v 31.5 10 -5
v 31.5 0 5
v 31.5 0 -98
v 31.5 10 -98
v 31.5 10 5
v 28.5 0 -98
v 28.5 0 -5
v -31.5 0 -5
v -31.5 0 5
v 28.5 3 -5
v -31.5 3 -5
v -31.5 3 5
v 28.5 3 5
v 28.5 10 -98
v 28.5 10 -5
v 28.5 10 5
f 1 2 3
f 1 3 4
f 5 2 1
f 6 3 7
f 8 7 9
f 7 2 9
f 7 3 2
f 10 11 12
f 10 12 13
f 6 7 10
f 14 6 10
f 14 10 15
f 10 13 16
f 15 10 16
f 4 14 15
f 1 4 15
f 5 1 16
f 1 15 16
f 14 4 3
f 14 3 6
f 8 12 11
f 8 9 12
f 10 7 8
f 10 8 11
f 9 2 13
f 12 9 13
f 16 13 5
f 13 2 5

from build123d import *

# Parameters (mm, degrees)
SKETCH_1_W          = 63
SKETCH_1_H          = 10
EXTRUDE_1_DEPTH     = 2
SKETCH_4_W          = 2
SKETCH_4_H          = 10
EXTRUDE_2_DEPTH     = 93
SKETCH_5_W          = 61
SKETCH_5_H          = 10
EXTRUDE_3_DEPTH     = 1
SKETCH_6_W          = 10
SKETCH_6_H          = 92
EXTRUDE_4_DEPTH     = 1
SKETCH_7_W          = 3
SKETCH_7_H          = 10
EXTRUDE_5_DEPTH     = 93
SKETCH_10_W         = 26.594312394
SKETCH_10_H         = 101.559656513
CUT_EXTRUDE_1_DEPTH = 93


with BuildPart() as part:
    # 草图1 → 凸台-拉伸1 (new body)
    with BuildSketch(Plane(origin=(0, 0, 0), x_dir=(1, 0, 0), z_dir=(0, 1, 0))):
        Rectangle(SKETCH_1_W, SKETCH_1_H)
    extrude(amount=EXTRUDE_1_DEPTH)

    # 草图4 → 凸台-拉伸2 (add)
    with BuildSketch(Plane(origin=(0, 2, 0), x_dir=(1, 0, 0), z_dir=(0, 1, 0))):
        with Locations((30.5, 0)):
            Rectangle(SKETCH_4_W, SKETCH_4_H)
    extrude(amount=EXTRUDE_2_DEPTH)

    # 草图5 → 凸台-拉伸3 (add)
    with BuildSketch(Plane(origin=(0, 2, 0), x_dir=(1, 0, 0), z_dir=(0, 1, 0))):
        with Locations((-1, 0)):
            Rectangle(SKETCH_5_W, SKETCH_5_H)
    extrude(amount=EXTRUDE_3_DEPTH)

    # 草图6 → 凸台-拉伸4 (add)
    with BuildSketch(Plane.ZY.offset(-29.5)):
        with Locations((0, 49)):
            Rectangle(SKETCH_6_W, SKETCH_6_H)
    extrude(amount=EXTRUDE_4_DEPTH)

    # 草图7 → 凸台-拉伸5 (add)
    with BuildSketch(Plane(origin=(0, 0, -5), x_dir=(-1, 0, 0), z_dir=(0, 0, -1))):
        with Locations((-30, 5)):
            Rectangle(SKETCH_7_W, SKETCH_7_H)
    extrude(amount=EXTRUDE_5_DEPTH)

    # 草图10 → 切除-拉伸1 (cut)
    with BuildSketch(Plane.ZY.offset(-28.5)):
        with Locations((8.297156197, 60.779828257)):
            Rectangle(SKETCH_10_W, SKETCH_10_H)
    extrude(amount=-CUT_EXTRUDE_1_DEPTH, mode=Mode.SUBTRACT)


solid = part.part
